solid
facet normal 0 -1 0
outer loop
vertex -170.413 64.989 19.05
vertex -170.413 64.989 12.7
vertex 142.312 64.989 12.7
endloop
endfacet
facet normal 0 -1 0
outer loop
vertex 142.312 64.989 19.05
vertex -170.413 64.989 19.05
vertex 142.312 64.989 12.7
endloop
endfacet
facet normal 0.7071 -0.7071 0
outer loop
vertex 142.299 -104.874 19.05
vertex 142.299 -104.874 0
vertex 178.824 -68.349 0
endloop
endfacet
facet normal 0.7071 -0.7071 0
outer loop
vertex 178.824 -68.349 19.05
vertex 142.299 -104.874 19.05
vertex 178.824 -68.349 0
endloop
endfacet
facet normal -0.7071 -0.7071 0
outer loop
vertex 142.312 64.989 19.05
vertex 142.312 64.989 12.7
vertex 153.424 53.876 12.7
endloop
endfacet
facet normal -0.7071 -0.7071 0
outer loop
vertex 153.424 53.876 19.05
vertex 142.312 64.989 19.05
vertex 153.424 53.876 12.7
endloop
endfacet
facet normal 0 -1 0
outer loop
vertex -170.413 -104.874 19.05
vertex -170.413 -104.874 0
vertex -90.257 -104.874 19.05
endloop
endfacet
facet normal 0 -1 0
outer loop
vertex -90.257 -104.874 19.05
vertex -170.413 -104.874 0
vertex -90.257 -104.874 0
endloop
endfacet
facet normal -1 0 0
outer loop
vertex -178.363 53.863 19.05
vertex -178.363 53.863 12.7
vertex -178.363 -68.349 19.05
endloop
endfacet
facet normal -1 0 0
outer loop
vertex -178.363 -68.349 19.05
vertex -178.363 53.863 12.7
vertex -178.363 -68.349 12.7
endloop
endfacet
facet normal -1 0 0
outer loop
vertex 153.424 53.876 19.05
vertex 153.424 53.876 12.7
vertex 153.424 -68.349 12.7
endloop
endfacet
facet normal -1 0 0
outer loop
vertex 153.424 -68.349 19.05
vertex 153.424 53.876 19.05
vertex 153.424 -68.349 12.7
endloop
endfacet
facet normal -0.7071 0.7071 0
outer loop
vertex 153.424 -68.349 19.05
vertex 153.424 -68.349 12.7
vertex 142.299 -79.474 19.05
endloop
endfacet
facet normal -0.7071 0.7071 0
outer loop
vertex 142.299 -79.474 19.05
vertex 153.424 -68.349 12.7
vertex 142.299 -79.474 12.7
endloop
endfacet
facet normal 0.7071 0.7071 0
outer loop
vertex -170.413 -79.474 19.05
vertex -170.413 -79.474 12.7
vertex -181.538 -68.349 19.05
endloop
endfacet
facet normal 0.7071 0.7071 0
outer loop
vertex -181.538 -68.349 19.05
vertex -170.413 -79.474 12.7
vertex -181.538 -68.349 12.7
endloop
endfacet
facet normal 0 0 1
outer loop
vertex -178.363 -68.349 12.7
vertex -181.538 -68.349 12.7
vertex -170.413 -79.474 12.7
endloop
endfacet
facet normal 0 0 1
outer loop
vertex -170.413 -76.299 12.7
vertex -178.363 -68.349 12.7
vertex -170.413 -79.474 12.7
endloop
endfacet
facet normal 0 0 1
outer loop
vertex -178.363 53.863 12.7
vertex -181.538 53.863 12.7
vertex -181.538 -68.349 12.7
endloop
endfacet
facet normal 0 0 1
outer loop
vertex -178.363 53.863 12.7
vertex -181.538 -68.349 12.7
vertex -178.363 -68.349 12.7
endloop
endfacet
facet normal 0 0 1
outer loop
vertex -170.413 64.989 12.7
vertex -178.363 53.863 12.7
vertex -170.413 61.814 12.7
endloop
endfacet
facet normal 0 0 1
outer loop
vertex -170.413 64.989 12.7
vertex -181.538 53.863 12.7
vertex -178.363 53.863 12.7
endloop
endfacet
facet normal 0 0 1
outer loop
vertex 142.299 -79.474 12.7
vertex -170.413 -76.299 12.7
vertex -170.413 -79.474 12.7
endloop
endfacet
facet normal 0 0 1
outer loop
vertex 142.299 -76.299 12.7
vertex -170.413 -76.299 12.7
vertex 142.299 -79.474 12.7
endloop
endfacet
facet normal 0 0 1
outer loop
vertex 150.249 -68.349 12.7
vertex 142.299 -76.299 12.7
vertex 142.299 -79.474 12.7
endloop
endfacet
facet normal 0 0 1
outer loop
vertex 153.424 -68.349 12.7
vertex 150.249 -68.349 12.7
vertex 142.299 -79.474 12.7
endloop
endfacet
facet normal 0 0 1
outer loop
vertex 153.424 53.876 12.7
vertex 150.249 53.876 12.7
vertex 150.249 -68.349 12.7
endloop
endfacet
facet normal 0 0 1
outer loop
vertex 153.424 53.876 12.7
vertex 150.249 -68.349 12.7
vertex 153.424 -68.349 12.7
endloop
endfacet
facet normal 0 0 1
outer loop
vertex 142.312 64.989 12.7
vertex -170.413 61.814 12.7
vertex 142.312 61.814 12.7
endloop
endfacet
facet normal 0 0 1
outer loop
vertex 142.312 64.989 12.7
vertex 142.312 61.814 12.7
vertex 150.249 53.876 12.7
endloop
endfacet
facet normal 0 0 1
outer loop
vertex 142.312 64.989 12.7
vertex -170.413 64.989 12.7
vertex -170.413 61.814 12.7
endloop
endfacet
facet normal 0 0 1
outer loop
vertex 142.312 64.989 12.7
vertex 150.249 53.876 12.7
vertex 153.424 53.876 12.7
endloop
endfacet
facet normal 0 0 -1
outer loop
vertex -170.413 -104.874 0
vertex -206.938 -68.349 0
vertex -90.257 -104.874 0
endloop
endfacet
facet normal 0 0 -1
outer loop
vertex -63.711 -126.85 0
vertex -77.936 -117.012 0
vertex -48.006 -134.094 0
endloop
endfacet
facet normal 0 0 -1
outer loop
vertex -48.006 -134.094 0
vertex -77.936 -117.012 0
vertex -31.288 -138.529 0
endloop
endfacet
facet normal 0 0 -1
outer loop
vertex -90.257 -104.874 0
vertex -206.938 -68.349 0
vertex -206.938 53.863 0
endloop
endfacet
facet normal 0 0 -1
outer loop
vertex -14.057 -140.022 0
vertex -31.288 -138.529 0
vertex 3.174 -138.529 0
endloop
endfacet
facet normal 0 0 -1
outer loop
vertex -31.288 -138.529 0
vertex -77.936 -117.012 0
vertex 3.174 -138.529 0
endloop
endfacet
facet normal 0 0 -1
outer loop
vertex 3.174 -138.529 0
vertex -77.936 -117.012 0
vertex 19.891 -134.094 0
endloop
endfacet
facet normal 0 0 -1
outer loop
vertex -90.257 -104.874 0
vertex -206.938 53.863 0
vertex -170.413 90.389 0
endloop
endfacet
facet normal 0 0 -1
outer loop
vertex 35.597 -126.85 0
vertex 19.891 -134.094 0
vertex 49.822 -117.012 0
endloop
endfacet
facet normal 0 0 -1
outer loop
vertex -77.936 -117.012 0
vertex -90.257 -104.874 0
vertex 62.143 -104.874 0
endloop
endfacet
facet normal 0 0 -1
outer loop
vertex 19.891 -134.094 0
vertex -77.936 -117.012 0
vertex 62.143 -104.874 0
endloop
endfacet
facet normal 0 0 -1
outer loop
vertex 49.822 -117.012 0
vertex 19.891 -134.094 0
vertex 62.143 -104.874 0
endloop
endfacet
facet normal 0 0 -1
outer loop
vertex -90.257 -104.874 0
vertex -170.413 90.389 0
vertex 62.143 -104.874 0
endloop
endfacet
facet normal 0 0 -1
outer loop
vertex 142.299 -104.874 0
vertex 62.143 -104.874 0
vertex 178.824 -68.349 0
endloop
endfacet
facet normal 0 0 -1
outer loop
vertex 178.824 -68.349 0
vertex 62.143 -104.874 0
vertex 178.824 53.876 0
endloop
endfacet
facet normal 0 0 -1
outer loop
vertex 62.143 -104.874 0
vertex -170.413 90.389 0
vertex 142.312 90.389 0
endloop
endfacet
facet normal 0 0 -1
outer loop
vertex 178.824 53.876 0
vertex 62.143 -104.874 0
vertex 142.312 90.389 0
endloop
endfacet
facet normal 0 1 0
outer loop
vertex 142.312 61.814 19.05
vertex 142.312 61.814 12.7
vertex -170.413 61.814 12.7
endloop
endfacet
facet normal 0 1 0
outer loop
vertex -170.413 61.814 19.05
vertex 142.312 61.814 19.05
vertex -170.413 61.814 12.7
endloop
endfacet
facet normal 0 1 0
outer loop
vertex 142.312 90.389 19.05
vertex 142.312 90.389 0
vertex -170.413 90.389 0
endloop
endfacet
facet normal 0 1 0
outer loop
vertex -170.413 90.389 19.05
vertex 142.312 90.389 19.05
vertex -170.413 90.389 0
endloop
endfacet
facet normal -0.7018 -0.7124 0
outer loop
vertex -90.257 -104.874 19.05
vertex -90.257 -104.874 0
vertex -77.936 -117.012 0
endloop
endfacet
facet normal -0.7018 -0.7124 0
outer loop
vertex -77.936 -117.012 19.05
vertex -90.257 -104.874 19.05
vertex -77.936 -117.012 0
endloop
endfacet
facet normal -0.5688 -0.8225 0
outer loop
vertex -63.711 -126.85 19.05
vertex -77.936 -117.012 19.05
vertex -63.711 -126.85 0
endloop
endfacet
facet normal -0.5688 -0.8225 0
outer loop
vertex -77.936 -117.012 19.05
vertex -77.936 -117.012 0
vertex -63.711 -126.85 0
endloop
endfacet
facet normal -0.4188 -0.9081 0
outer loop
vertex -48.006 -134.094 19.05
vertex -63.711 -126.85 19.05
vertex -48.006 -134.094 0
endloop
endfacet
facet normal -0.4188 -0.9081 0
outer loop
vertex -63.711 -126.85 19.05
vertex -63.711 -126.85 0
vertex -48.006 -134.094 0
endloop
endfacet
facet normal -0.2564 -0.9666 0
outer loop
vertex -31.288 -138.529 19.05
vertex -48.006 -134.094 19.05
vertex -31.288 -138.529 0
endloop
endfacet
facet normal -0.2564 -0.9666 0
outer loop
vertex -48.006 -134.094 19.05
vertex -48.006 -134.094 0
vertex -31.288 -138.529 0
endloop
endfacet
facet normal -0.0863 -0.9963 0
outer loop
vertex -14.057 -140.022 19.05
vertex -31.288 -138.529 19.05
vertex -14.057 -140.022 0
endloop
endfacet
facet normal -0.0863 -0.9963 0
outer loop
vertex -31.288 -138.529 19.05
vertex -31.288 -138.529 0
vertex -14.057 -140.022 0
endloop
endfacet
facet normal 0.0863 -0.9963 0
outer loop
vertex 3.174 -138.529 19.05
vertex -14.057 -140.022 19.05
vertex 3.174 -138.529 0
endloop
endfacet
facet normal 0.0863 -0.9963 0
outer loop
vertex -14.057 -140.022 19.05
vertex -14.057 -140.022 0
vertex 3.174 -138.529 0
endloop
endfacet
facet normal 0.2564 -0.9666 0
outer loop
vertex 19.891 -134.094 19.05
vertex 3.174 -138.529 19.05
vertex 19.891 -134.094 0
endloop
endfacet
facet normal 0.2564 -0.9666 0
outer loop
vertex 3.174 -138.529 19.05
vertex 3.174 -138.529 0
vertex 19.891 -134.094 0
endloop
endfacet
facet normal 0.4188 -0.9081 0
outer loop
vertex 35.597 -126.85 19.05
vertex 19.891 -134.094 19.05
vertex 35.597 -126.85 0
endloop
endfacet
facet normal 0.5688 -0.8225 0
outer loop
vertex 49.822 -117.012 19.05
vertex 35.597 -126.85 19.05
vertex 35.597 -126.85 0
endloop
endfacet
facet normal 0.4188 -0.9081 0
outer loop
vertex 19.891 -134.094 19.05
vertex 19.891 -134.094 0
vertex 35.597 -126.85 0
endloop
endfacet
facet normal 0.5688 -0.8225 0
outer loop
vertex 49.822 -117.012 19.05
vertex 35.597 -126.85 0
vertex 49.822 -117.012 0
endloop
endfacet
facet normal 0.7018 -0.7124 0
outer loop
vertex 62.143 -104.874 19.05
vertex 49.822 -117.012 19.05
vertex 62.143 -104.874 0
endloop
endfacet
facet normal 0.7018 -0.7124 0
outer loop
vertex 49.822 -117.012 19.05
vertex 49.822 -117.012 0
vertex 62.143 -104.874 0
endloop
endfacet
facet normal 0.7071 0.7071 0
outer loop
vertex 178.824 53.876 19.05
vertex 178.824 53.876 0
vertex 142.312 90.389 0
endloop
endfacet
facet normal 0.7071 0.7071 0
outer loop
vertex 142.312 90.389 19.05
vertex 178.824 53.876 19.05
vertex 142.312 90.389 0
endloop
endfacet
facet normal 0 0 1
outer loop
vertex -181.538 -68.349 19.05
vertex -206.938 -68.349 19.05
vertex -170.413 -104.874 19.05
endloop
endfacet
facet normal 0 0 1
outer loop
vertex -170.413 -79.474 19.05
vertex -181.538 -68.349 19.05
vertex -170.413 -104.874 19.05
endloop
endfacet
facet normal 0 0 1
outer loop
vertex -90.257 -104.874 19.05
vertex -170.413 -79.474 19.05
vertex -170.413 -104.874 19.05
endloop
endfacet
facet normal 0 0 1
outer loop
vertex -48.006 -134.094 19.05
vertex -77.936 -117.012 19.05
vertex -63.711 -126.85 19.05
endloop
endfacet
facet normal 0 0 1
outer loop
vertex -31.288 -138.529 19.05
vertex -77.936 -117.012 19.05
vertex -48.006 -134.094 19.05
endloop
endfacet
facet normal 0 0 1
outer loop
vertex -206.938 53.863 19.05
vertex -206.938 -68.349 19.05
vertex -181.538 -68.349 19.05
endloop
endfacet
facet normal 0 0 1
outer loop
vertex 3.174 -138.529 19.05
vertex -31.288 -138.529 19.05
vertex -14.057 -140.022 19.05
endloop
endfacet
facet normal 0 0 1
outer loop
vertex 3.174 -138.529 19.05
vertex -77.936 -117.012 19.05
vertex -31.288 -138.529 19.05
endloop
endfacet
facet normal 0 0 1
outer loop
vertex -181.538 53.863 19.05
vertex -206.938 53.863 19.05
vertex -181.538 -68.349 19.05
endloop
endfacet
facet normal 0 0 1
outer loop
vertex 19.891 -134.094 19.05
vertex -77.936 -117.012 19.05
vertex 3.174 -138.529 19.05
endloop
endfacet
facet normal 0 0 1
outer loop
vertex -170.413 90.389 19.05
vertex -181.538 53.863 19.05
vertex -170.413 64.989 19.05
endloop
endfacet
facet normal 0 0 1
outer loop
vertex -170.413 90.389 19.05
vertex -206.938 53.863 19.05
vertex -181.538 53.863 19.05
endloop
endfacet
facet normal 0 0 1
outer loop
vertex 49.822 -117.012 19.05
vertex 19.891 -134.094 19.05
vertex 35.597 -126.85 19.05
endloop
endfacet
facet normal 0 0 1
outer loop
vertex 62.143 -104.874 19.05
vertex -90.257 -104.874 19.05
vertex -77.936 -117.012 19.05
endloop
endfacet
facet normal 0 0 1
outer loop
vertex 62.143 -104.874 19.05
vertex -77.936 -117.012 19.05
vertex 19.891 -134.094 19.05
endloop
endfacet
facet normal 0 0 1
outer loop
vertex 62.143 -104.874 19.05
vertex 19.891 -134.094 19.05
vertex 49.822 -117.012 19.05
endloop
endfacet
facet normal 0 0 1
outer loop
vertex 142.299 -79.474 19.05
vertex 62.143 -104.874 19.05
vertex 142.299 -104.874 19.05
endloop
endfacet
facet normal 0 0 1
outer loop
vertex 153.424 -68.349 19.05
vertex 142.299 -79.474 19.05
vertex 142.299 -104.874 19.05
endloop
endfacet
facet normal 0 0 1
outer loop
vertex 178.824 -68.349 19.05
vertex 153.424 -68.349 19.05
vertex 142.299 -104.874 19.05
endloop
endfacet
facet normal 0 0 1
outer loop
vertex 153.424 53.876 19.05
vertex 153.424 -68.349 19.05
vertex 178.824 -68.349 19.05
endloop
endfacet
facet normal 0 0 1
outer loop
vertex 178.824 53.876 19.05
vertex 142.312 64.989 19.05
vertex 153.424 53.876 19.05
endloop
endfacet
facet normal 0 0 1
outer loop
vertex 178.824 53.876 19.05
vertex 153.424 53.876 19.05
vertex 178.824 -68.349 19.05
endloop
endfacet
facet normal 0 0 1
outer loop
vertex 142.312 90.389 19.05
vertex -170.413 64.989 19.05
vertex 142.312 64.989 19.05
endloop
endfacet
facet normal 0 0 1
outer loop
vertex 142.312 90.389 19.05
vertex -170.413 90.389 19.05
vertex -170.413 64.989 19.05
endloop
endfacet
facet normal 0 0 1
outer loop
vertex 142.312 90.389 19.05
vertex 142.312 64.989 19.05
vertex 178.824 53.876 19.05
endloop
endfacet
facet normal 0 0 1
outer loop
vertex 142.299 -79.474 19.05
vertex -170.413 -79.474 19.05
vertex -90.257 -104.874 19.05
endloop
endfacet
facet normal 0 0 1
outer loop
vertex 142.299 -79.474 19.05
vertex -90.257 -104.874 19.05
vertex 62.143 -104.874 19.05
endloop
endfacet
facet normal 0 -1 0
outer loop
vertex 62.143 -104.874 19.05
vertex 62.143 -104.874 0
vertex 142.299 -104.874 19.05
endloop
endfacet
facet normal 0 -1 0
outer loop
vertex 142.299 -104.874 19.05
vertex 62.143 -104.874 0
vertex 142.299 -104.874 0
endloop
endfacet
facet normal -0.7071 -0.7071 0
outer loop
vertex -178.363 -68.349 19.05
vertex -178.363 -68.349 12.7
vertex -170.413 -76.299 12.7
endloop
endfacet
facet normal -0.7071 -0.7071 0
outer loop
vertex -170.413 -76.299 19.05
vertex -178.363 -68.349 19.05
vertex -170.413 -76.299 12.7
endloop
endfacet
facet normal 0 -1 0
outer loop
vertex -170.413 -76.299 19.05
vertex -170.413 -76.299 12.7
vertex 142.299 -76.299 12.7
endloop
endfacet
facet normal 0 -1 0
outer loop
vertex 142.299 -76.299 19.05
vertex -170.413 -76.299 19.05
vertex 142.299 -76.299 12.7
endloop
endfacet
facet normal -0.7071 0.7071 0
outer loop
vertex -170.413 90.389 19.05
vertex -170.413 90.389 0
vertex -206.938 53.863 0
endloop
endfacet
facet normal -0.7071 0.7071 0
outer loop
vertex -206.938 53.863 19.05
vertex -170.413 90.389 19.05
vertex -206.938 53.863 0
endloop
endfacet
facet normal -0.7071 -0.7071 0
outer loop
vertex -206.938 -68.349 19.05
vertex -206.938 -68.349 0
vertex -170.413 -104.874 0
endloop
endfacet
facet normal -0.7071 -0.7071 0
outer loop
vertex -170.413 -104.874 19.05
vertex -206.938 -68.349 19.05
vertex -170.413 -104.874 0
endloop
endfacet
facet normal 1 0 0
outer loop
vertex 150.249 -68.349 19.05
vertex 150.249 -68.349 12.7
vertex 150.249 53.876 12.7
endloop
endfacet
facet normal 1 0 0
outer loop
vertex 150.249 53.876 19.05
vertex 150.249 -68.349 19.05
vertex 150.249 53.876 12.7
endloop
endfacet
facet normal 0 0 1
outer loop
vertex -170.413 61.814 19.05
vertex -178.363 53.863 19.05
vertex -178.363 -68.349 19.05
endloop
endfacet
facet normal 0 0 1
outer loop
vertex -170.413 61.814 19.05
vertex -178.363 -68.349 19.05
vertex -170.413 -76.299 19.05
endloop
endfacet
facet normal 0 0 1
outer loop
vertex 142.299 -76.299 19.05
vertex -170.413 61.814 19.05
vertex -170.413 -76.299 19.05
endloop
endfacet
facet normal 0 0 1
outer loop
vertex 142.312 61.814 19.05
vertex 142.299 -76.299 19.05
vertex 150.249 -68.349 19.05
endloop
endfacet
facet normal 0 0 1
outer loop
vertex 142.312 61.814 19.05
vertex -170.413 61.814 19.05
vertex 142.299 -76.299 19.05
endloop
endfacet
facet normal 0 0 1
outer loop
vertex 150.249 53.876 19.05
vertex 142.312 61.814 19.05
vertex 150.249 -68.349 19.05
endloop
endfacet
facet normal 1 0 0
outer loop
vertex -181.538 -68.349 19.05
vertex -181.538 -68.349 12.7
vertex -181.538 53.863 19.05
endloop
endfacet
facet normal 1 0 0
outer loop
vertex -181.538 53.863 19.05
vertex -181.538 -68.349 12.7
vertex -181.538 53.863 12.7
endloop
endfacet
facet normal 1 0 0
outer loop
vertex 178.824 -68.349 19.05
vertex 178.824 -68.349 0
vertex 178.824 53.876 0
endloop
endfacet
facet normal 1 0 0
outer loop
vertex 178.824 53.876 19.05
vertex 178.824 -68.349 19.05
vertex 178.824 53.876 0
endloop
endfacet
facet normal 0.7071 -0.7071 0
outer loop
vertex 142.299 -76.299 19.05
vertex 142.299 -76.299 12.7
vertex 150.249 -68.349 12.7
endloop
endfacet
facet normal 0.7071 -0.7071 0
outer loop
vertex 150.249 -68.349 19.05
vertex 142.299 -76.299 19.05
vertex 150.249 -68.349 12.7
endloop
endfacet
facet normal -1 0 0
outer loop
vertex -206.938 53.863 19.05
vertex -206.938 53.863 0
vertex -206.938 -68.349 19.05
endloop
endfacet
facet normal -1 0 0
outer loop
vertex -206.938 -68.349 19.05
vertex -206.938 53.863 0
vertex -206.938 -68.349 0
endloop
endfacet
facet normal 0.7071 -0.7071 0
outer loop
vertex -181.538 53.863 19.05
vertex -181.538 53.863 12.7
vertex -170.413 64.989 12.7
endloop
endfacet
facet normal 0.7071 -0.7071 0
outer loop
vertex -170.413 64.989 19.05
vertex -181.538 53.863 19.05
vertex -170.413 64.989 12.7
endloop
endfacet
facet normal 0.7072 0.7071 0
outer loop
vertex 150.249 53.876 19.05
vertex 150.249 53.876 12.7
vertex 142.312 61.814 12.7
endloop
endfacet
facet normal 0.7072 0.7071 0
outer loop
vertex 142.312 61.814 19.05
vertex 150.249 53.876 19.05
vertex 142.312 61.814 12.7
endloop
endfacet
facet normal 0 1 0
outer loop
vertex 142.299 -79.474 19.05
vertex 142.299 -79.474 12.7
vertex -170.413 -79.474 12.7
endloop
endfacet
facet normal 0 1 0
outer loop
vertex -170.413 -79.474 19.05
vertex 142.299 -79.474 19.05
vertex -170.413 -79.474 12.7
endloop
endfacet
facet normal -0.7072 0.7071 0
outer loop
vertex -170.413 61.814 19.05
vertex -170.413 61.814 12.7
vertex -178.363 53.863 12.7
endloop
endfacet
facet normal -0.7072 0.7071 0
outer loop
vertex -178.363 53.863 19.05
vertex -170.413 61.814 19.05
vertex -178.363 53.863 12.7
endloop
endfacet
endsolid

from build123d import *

# Parameters (mm, degrees)
F1_DEPTH = 19.05
F2_DEPTH = 12.7
F3_DEPTH = 19.05


with BuildPart() as f1:
    # F0 (on Top) → F1 (new body)
    with BuildSketch(Plane.XY):
        Polygon((-170.413183, 61.813528), (-178.363383, 53.863328), (-178.363383, -68.348772), (-170.413183, -76.298972), (142.298917, -76.298972), (150.249117, -68.348772), (150.249117, 53.876028), (142.311617, 61.813528), align=None)
    extrude(amount=F1_DEPTH)

    # F0 (on Top) → F2 (join)
    with BuildSketch(Plane.XY):
        Polygon((153.424117, 53.876028), (142.311617, 64.988528), (-170.413183, 64.988528), (-181.538383, 53.863328), (-181.538383, -68.348772), (-170.413183, -79.473972), (142.298917, -79.473972), (153.424117, -68.348772), align=None)
        Polygon((-178.363383, -68.348772), (-178.363383, 53.863328), (-170.413183, 61.813528), (142.311617, 61.813528), (150.249117, 53.876028), (150.249117, -68.348772), (142.298917, -76.298972), (-170.413183, -76.298972), align=None, mode=Mode.SUBTRACT)
    extrude(amount=F2_DEPTH)

    # F0 (on Top) → F3 (join)
    with BuildSketch(Plane.XY):
        with BuildLine():
            Line((178.824117, 53.876028), (142.311617, 90.388528))
            Line((142.311617, 90.388528), (-170.413183, 90.388528))
            Line((-170.413183, 90.388528), (-206.938383, 53.863328))
            Line((-206.938383, 53.863328), (-206.938383, -68.348772))
            Line((-206.938383, -68.348772), (-170.413183, -104.873972))
            Line((-170.413183, -104.873972), (-90.257133, -104.873972))
            ThreePointArc((-90.257133, -104.873972), (-14.057133, -140.022369), (62.142867, -104.873972))
            Line((62.142867, -104.873972), (142.298917, -104.873972))
            Line((142.298917, -104.873972), (178.824117, -68.348772))
            Line((178.824117, -68.348772), (178.824117, 53.876028))
        make_face()
        Polygon((-170.413183, 64.988528), (142.311617, 64.988528), (153.424117, 53.876028), (153.424117, -68.348772), (142.298917, -79.473972), (-170.413183, -79.473972), (-181.538383, -68.348772), (-181.538383, 53.863328), align=None, mode=Mode.SUBTRACT)
    extrude(amount=F3_DEPTH)


solid = f1.part
